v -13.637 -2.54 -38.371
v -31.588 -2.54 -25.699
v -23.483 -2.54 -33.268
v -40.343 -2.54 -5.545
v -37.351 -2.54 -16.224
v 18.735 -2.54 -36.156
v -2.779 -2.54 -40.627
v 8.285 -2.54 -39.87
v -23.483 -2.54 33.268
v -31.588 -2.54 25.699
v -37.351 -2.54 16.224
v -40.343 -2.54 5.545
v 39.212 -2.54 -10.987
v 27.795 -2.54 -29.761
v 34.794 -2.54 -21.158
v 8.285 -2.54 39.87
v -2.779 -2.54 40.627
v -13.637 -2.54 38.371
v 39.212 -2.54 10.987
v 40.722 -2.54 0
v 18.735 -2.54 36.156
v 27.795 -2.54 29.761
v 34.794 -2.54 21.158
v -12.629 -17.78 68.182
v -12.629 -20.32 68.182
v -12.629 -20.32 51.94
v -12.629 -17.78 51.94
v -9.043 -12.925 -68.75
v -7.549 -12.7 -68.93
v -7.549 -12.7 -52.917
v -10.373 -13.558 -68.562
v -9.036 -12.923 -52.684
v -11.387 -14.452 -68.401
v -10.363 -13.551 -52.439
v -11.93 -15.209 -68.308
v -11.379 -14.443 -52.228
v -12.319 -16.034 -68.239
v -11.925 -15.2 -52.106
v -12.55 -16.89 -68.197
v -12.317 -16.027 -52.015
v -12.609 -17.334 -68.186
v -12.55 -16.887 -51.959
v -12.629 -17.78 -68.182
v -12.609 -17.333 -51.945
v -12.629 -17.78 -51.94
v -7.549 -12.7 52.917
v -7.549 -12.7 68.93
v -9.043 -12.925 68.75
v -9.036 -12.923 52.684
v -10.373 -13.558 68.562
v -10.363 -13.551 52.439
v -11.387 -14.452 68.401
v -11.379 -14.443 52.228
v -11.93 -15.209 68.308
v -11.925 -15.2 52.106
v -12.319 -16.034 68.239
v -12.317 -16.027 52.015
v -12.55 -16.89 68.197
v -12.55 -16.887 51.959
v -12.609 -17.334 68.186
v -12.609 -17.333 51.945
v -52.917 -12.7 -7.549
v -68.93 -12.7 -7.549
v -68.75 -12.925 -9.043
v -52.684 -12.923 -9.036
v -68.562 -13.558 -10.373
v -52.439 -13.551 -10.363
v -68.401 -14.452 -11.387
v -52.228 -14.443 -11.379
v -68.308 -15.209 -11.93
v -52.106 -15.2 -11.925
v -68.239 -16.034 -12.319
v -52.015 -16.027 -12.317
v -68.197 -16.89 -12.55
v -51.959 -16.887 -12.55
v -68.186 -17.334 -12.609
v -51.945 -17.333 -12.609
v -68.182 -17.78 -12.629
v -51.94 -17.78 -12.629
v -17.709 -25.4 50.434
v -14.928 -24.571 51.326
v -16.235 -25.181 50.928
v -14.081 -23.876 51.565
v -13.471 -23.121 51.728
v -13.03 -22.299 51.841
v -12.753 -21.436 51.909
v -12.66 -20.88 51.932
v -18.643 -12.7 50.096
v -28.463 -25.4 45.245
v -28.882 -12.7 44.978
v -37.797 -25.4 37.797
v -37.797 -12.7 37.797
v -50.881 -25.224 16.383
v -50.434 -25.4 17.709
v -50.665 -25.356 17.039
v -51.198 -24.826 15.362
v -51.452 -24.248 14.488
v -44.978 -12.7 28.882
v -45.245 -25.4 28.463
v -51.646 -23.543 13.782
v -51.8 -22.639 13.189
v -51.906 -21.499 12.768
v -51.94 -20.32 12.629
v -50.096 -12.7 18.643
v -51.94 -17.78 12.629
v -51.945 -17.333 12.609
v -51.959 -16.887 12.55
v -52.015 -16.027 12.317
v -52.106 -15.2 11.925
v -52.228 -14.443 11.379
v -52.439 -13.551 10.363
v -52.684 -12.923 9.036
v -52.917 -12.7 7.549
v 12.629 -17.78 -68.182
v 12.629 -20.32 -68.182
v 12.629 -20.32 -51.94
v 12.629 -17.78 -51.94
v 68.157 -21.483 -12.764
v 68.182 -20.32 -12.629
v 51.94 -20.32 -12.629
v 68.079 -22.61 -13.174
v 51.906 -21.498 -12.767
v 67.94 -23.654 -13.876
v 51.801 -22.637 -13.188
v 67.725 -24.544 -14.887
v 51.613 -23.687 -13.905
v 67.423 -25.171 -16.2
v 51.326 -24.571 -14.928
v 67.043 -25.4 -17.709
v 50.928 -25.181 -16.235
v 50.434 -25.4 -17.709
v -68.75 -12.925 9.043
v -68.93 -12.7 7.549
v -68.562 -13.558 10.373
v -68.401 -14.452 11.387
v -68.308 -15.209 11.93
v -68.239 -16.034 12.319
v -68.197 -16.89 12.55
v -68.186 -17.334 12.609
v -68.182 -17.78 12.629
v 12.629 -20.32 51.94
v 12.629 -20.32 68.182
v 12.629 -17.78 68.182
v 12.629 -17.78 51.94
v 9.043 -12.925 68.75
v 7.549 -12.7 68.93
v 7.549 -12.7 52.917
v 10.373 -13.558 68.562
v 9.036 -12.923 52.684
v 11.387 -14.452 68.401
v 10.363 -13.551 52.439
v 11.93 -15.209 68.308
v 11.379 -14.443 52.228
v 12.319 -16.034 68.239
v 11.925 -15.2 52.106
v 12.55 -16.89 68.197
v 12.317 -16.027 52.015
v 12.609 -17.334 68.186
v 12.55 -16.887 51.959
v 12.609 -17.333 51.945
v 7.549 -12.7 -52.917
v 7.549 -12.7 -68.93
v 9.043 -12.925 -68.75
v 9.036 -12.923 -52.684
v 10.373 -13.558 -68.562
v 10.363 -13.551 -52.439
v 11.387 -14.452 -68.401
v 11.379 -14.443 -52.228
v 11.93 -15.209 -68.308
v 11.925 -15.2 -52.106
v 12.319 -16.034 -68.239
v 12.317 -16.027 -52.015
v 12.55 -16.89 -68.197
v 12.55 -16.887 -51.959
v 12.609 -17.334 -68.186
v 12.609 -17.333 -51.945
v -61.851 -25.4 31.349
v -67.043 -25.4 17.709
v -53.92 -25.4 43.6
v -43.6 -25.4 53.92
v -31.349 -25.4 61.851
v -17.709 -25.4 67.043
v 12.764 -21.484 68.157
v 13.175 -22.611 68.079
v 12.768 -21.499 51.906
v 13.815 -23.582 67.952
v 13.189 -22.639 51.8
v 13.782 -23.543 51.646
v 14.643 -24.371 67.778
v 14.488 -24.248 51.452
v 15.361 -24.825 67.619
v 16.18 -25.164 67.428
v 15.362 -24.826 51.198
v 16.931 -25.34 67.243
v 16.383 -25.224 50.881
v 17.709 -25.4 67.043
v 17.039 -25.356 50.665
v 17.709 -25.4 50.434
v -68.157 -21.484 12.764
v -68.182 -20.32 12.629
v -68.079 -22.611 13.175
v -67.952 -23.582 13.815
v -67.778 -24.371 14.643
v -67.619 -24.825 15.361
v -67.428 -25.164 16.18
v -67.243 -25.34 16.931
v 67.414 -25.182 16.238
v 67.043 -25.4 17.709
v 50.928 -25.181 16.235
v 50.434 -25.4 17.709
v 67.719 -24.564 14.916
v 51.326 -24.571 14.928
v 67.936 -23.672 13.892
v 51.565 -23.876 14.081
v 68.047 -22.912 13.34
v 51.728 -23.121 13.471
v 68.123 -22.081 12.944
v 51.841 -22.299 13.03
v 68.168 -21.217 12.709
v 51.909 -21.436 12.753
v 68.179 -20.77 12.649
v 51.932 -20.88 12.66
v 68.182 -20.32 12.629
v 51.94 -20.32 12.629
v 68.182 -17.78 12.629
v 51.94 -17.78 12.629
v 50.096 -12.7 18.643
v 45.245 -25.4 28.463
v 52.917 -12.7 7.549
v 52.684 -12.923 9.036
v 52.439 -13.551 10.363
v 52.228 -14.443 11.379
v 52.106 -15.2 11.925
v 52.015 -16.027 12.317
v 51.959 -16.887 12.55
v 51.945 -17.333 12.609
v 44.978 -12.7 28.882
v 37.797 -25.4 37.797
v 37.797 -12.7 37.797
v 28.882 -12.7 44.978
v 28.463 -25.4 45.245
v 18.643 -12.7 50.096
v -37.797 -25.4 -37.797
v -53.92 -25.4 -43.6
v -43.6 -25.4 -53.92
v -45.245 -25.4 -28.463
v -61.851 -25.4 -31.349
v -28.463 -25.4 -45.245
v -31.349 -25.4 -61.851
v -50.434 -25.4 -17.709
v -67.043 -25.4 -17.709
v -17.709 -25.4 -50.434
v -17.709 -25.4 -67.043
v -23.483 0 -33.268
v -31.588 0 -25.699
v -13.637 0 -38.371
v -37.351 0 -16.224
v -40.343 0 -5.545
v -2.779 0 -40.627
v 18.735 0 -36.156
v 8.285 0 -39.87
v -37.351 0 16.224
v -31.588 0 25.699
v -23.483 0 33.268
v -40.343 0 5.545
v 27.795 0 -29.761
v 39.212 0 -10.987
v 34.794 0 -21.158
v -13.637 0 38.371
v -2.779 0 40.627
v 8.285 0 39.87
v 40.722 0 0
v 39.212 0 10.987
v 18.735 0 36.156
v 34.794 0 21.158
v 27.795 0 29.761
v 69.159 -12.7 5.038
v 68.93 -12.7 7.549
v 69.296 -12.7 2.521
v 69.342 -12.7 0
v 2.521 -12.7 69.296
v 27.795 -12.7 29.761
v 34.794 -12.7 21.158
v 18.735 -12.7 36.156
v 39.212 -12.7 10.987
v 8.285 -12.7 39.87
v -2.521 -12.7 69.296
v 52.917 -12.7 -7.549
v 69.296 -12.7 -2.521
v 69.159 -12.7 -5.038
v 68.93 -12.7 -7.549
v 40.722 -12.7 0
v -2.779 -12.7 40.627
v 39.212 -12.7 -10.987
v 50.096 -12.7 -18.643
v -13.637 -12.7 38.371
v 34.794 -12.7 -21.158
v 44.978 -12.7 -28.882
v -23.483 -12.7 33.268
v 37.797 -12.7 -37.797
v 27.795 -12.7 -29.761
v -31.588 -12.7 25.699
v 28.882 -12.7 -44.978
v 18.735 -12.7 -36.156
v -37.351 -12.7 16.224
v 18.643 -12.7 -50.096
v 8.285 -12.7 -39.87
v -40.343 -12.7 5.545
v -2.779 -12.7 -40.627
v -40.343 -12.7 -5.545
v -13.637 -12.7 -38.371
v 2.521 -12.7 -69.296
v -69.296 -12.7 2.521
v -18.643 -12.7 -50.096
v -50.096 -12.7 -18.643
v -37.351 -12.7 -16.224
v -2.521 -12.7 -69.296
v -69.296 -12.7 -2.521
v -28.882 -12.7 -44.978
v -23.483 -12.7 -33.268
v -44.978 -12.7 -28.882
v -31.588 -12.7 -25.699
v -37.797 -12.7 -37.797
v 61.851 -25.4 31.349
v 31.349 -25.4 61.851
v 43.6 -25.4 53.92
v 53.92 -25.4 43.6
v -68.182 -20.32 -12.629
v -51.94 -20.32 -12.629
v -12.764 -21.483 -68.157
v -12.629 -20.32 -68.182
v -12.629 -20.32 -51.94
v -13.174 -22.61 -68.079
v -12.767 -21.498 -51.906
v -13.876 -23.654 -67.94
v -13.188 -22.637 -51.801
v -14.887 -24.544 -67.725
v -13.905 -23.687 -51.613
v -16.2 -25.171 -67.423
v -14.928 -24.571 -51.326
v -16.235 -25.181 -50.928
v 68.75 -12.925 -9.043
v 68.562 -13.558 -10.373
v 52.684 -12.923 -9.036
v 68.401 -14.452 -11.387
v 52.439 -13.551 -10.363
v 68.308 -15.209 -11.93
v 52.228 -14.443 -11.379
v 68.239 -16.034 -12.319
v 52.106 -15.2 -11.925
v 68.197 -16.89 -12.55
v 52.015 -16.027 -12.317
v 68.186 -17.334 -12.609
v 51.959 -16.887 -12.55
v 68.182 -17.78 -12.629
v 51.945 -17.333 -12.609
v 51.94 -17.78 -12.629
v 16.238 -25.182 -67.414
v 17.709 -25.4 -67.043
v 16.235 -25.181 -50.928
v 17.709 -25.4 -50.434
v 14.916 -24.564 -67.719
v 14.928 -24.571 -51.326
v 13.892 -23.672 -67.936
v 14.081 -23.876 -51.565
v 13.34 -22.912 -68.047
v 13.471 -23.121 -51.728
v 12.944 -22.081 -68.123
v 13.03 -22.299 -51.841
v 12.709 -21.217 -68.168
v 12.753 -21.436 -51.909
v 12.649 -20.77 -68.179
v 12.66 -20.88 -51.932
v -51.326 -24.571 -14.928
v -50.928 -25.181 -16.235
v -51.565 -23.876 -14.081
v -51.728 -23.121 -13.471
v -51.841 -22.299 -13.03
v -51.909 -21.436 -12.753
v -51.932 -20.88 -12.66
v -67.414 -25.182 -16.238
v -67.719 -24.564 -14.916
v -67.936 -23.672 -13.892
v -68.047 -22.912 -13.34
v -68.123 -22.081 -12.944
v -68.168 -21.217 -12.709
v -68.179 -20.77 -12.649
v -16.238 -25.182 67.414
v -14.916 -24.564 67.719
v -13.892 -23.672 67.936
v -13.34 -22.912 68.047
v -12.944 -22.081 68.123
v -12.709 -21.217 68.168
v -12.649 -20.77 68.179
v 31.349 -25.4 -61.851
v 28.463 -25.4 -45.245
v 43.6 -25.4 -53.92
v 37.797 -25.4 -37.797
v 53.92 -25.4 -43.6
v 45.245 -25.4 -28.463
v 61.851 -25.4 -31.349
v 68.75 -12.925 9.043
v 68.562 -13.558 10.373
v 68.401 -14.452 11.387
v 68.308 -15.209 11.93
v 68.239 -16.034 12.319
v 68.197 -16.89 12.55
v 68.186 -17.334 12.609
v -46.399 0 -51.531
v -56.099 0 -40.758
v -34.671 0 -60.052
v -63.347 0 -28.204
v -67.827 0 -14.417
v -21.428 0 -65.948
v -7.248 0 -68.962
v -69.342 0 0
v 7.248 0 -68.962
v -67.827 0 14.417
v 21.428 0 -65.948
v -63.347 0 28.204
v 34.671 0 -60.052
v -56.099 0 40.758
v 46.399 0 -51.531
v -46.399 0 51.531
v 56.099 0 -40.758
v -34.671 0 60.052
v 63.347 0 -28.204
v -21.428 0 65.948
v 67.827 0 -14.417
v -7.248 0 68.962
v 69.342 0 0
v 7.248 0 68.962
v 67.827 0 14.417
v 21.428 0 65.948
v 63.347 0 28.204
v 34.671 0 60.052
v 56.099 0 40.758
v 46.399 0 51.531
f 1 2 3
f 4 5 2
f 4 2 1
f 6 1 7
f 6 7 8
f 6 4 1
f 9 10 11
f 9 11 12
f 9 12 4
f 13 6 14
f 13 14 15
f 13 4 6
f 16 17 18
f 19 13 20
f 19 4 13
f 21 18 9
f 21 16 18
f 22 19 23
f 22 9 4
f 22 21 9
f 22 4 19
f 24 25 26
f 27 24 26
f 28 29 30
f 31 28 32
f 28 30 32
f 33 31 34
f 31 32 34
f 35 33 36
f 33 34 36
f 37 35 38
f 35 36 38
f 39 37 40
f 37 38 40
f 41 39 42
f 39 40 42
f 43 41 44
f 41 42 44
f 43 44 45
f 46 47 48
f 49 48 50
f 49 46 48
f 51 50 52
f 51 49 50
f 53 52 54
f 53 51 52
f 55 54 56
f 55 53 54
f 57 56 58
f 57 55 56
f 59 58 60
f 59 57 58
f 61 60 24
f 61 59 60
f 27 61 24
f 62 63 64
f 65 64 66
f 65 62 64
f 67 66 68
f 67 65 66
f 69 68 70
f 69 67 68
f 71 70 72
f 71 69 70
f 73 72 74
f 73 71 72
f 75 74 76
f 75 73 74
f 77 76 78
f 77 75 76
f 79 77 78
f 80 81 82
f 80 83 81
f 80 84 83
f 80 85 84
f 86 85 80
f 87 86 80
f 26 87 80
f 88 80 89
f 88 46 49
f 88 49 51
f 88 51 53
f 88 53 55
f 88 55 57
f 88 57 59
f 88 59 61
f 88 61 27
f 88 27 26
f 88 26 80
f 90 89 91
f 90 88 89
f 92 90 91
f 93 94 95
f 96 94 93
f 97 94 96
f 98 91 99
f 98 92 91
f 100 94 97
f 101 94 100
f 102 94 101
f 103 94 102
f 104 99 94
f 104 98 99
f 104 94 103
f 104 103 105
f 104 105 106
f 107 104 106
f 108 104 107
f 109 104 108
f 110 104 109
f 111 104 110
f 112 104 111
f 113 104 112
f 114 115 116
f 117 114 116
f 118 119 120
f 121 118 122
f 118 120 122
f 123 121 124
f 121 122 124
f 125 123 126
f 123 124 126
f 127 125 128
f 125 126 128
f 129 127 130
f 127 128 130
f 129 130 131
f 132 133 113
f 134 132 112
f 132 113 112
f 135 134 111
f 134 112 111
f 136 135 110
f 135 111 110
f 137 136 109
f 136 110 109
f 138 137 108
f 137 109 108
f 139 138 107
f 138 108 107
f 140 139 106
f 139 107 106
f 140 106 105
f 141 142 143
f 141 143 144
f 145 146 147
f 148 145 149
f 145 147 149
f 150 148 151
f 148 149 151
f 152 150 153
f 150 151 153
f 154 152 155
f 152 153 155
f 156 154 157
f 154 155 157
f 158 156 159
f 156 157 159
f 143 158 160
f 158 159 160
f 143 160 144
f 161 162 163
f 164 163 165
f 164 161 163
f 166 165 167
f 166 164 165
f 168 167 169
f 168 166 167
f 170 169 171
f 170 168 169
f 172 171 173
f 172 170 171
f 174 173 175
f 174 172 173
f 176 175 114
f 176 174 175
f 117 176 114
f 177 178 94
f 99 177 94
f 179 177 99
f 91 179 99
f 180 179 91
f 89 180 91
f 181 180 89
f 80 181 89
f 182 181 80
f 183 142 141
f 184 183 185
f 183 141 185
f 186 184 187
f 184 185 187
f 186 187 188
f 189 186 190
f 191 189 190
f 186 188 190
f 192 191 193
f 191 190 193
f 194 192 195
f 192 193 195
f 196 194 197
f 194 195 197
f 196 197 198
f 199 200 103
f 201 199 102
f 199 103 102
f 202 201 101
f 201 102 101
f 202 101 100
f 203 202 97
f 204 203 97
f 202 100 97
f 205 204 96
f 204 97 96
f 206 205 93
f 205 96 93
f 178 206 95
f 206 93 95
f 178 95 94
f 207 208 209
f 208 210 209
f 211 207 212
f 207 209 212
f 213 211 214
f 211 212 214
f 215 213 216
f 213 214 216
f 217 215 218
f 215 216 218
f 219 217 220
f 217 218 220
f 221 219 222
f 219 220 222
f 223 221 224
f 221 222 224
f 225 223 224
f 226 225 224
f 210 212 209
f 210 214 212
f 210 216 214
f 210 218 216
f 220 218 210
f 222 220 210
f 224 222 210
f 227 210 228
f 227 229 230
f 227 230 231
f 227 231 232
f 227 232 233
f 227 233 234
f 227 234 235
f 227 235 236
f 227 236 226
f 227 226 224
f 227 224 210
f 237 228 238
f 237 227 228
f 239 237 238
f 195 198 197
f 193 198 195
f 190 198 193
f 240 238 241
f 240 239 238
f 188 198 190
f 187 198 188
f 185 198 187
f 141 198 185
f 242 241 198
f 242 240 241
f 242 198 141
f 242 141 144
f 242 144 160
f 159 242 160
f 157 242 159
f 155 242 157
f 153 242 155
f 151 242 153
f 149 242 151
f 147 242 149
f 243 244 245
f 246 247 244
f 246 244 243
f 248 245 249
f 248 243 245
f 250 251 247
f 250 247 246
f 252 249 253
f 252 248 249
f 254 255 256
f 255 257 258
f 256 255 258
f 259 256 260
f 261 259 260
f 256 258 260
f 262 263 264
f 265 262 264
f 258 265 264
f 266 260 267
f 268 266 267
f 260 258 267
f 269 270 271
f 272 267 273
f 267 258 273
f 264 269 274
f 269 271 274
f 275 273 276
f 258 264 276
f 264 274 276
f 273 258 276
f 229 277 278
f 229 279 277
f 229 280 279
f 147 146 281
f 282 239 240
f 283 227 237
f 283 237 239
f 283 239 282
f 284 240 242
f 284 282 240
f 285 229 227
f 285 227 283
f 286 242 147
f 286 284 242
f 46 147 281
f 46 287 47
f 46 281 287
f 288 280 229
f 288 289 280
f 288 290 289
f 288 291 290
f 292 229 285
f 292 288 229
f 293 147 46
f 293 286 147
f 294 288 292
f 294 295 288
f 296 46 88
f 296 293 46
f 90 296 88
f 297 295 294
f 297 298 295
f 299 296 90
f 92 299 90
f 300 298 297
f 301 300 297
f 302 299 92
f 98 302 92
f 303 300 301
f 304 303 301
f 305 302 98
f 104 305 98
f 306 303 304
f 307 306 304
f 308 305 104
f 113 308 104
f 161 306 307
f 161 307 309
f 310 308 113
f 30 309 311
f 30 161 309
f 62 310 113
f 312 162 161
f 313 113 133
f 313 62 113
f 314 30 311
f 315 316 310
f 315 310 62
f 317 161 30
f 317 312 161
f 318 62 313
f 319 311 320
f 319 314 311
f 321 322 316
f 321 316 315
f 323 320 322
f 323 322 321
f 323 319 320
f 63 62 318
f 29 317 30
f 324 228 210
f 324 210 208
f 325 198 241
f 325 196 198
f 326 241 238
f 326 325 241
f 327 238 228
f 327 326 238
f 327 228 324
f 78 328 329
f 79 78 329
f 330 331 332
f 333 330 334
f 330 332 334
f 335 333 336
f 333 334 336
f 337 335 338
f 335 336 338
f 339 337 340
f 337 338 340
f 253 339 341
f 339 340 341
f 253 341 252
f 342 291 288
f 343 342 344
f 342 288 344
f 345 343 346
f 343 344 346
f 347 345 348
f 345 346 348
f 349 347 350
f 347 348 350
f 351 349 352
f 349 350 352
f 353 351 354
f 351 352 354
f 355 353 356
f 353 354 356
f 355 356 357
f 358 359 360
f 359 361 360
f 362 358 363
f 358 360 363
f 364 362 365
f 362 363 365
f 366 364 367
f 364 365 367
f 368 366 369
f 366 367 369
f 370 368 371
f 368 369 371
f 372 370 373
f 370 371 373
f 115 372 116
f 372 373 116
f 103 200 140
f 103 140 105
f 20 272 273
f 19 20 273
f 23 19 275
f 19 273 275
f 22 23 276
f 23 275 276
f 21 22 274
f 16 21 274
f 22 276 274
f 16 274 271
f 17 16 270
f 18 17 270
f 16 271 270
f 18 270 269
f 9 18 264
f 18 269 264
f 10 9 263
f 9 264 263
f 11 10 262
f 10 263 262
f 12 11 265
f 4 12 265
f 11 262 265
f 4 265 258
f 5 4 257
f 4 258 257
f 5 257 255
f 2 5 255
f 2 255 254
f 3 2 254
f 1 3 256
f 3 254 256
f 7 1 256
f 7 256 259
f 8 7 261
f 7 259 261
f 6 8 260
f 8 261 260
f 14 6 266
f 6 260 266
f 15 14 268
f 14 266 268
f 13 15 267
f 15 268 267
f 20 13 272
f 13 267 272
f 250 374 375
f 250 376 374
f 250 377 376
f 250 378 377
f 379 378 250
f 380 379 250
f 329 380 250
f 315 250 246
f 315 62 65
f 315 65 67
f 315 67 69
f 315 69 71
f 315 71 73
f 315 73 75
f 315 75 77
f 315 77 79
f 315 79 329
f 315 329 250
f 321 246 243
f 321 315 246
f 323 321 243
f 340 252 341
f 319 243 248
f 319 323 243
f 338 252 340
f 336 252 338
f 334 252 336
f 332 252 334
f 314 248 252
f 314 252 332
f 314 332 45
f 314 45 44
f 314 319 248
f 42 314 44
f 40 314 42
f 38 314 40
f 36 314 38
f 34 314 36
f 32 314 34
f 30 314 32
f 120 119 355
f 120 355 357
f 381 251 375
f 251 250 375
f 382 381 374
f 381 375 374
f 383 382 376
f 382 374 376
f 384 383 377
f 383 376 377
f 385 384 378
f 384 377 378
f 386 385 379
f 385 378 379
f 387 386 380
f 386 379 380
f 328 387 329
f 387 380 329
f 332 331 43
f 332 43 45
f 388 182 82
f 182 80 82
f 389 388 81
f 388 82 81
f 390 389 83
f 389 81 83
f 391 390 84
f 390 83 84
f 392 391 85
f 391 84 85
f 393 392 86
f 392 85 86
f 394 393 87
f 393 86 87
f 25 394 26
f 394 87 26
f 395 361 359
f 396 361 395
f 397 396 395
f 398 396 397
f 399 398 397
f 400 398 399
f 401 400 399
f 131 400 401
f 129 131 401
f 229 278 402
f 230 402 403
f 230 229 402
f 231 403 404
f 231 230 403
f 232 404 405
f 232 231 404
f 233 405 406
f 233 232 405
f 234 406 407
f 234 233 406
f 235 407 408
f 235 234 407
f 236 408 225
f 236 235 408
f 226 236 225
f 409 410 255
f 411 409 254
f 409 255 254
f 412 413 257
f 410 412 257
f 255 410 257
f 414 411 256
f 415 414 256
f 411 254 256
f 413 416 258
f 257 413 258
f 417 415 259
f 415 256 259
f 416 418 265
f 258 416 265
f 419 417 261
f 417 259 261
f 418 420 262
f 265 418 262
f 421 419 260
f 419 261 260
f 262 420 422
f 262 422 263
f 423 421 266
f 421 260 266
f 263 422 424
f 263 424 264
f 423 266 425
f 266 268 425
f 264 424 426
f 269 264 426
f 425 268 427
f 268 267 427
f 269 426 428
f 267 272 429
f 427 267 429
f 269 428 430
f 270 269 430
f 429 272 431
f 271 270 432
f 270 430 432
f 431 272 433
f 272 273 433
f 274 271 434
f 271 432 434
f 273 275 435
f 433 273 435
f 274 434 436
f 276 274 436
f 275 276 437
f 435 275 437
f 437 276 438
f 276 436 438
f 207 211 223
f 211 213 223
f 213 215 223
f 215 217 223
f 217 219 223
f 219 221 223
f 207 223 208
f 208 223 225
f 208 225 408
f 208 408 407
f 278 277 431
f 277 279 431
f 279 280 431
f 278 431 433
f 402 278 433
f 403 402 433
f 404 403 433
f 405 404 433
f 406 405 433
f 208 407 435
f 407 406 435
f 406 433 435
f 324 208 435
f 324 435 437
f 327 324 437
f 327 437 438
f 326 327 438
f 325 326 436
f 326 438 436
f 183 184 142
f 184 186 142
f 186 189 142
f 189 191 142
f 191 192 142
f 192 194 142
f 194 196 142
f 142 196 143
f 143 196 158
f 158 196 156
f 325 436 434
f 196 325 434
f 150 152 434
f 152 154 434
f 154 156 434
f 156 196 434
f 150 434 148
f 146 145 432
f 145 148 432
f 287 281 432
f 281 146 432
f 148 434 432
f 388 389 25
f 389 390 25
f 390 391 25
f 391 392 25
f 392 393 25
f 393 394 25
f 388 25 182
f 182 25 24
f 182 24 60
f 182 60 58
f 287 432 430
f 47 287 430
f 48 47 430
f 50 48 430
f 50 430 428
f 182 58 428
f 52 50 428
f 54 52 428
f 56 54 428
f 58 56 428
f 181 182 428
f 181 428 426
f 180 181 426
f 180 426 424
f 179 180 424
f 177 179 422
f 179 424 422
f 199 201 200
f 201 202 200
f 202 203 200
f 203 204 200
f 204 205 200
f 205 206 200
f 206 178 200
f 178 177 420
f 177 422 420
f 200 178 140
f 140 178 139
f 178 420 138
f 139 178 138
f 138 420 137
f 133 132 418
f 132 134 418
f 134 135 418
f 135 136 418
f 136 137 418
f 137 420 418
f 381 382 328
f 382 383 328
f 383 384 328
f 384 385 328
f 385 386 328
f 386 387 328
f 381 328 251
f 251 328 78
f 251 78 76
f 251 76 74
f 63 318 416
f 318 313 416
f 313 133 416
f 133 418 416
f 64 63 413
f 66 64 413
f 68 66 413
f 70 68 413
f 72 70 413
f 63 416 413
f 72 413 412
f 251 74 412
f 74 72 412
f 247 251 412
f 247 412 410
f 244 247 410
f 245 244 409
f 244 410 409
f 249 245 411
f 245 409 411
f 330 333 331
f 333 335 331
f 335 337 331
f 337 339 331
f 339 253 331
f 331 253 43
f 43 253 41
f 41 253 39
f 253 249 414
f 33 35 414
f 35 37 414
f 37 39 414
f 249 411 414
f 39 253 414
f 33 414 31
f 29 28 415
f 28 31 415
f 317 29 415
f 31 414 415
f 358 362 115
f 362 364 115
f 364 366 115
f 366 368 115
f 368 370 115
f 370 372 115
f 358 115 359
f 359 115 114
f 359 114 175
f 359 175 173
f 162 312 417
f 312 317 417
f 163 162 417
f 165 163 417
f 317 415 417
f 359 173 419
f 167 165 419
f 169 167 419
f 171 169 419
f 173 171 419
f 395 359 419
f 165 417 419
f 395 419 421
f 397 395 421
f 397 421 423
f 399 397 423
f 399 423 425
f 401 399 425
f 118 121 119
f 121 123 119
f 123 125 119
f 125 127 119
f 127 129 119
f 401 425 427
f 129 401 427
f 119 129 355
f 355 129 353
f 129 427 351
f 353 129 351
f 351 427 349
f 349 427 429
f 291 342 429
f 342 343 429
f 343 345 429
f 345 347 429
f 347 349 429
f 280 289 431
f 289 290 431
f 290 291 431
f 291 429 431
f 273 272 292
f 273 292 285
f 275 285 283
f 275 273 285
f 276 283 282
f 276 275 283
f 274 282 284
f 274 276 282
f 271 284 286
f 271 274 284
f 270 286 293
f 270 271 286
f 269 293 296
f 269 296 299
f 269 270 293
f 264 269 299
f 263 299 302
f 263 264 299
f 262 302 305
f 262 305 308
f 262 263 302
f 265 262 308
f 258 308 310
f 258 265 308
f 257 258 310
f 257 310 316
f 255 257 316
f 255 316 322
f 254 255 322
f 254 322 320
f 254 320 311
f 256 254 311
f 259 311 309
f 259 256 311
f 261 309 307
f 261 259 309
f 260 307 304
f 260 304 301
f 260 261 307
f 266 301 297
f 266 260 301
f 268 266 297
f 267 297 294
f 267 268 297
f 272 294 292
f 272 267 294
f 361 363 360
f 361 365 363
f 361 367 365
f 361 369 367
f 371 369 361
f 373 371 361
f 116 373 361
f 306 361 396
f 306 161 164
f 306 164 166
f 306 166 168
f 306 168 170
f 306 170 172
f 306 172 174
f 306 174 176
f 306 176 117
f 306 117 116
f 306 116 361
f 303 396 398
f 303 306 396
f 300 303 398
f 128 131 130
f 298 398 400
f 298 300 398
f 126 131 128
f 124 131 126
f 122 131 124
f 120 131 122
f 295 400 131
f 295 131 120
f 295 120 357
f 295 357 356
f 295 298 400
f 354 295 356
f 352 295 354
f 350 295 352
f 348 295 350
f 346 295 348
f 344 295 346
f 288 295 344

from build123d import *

# Parameters (mm, degrees)
F0_R            = 40.7218115667
F1_DEPTH        = 2.54
F0_R_2          = 53.4529743156
F2_DEPTH        = 12.7
F0_R_3          = 69.3420856698
F3_DEPTH        = 25.4
F4_W            = 23.4954506159
F4_H            = 25.2576172352
F5_DEPTH        = 12.7
F5_COPIES_COUNT = 4
F6_R            = 5.08


# Not quite as in the source:
# - a pattern or mirror of a feature is missing from the dataset's text; its kind, count and spacing are read off the source's solid


with BuildPart() as f1:
    # F0 (on Front) → F1 (new body)
    with BuildSketch(Plane.XZ):
        Circle(F0_R)
    extrude(amount=F1_DEPTH)


with BuildPart() as f2:
    # F0 (on Front) → F2 (new body)
    with BuildSketch(Plane.XZ):
        Circle(F0_R_2)
        Circle(F0_R, mode=Mode.SUBTRACT)
    extrude(amount=F2_DEPTH)

    # F0 (on Front) → F3 (join)
    with BuildSketch(Plane.XZ):
        Circle(F0_R_3)
        Circle(F0_R_2, mode=Mode.SUBTRACT)
    extrude(amount=F3_DEPTH)

    # F4 (on face) → F5 (cut)
    with BuildSketch(Plane.XZ.offset(25.4)):
        with Locations((-62.8503486514, 0)):
            Rectangle(F4_W, F4_H)
    f5 = extrude(amount=-F5_DEPTH, mode=Mode.SUBTRACT)

    # F5_copies: F5 ×4 about axis
    f5_copies_axis = Axis((0, 0, 0), (0, 1, 0))
    for i in range(1, F5_COPIES_COUNT):
        add(f5.rotate(f5_copies_axis, i * 360 / F5_COPIES_COUNT), mode=Mode.SUBTRACT)

    # F6
    f6_edges = [f2.edges().sort_by_distance(p)[0] for p in [
        (-60.06105, -12.7, 12.628809),
        (-60.06105, -12.7, -12.628809),
        (-60.06105, -25.4, -12.628809),
        (-60.06105, -25.4, 12.628809),
        (-12.628809, -12.7, -60.06105),
        (12.628809, -12.7, -60.06105),
        (60.06105, -12.7, -12.628809),
        (60.06105, -12.7, 12.628809),
        (12.628809, -12.7, 60.06105),
        (-12.628809, -12.7, 60.06105),
        (-12.628809, -25.4, 60.06105),
        (12.628809, -25.4, 60.06105),
        (60.06105, -25.4, 12.628809),
        (60.06105, -25.4, -12.628809),
        (12.628809, -25.4, -60.06105),
        (-12.628809, -25.4, -60.06105),
    ]]
    fillet(f6_edges, radius=F6_R)


solid = Compound([f1.part, f2.part])
